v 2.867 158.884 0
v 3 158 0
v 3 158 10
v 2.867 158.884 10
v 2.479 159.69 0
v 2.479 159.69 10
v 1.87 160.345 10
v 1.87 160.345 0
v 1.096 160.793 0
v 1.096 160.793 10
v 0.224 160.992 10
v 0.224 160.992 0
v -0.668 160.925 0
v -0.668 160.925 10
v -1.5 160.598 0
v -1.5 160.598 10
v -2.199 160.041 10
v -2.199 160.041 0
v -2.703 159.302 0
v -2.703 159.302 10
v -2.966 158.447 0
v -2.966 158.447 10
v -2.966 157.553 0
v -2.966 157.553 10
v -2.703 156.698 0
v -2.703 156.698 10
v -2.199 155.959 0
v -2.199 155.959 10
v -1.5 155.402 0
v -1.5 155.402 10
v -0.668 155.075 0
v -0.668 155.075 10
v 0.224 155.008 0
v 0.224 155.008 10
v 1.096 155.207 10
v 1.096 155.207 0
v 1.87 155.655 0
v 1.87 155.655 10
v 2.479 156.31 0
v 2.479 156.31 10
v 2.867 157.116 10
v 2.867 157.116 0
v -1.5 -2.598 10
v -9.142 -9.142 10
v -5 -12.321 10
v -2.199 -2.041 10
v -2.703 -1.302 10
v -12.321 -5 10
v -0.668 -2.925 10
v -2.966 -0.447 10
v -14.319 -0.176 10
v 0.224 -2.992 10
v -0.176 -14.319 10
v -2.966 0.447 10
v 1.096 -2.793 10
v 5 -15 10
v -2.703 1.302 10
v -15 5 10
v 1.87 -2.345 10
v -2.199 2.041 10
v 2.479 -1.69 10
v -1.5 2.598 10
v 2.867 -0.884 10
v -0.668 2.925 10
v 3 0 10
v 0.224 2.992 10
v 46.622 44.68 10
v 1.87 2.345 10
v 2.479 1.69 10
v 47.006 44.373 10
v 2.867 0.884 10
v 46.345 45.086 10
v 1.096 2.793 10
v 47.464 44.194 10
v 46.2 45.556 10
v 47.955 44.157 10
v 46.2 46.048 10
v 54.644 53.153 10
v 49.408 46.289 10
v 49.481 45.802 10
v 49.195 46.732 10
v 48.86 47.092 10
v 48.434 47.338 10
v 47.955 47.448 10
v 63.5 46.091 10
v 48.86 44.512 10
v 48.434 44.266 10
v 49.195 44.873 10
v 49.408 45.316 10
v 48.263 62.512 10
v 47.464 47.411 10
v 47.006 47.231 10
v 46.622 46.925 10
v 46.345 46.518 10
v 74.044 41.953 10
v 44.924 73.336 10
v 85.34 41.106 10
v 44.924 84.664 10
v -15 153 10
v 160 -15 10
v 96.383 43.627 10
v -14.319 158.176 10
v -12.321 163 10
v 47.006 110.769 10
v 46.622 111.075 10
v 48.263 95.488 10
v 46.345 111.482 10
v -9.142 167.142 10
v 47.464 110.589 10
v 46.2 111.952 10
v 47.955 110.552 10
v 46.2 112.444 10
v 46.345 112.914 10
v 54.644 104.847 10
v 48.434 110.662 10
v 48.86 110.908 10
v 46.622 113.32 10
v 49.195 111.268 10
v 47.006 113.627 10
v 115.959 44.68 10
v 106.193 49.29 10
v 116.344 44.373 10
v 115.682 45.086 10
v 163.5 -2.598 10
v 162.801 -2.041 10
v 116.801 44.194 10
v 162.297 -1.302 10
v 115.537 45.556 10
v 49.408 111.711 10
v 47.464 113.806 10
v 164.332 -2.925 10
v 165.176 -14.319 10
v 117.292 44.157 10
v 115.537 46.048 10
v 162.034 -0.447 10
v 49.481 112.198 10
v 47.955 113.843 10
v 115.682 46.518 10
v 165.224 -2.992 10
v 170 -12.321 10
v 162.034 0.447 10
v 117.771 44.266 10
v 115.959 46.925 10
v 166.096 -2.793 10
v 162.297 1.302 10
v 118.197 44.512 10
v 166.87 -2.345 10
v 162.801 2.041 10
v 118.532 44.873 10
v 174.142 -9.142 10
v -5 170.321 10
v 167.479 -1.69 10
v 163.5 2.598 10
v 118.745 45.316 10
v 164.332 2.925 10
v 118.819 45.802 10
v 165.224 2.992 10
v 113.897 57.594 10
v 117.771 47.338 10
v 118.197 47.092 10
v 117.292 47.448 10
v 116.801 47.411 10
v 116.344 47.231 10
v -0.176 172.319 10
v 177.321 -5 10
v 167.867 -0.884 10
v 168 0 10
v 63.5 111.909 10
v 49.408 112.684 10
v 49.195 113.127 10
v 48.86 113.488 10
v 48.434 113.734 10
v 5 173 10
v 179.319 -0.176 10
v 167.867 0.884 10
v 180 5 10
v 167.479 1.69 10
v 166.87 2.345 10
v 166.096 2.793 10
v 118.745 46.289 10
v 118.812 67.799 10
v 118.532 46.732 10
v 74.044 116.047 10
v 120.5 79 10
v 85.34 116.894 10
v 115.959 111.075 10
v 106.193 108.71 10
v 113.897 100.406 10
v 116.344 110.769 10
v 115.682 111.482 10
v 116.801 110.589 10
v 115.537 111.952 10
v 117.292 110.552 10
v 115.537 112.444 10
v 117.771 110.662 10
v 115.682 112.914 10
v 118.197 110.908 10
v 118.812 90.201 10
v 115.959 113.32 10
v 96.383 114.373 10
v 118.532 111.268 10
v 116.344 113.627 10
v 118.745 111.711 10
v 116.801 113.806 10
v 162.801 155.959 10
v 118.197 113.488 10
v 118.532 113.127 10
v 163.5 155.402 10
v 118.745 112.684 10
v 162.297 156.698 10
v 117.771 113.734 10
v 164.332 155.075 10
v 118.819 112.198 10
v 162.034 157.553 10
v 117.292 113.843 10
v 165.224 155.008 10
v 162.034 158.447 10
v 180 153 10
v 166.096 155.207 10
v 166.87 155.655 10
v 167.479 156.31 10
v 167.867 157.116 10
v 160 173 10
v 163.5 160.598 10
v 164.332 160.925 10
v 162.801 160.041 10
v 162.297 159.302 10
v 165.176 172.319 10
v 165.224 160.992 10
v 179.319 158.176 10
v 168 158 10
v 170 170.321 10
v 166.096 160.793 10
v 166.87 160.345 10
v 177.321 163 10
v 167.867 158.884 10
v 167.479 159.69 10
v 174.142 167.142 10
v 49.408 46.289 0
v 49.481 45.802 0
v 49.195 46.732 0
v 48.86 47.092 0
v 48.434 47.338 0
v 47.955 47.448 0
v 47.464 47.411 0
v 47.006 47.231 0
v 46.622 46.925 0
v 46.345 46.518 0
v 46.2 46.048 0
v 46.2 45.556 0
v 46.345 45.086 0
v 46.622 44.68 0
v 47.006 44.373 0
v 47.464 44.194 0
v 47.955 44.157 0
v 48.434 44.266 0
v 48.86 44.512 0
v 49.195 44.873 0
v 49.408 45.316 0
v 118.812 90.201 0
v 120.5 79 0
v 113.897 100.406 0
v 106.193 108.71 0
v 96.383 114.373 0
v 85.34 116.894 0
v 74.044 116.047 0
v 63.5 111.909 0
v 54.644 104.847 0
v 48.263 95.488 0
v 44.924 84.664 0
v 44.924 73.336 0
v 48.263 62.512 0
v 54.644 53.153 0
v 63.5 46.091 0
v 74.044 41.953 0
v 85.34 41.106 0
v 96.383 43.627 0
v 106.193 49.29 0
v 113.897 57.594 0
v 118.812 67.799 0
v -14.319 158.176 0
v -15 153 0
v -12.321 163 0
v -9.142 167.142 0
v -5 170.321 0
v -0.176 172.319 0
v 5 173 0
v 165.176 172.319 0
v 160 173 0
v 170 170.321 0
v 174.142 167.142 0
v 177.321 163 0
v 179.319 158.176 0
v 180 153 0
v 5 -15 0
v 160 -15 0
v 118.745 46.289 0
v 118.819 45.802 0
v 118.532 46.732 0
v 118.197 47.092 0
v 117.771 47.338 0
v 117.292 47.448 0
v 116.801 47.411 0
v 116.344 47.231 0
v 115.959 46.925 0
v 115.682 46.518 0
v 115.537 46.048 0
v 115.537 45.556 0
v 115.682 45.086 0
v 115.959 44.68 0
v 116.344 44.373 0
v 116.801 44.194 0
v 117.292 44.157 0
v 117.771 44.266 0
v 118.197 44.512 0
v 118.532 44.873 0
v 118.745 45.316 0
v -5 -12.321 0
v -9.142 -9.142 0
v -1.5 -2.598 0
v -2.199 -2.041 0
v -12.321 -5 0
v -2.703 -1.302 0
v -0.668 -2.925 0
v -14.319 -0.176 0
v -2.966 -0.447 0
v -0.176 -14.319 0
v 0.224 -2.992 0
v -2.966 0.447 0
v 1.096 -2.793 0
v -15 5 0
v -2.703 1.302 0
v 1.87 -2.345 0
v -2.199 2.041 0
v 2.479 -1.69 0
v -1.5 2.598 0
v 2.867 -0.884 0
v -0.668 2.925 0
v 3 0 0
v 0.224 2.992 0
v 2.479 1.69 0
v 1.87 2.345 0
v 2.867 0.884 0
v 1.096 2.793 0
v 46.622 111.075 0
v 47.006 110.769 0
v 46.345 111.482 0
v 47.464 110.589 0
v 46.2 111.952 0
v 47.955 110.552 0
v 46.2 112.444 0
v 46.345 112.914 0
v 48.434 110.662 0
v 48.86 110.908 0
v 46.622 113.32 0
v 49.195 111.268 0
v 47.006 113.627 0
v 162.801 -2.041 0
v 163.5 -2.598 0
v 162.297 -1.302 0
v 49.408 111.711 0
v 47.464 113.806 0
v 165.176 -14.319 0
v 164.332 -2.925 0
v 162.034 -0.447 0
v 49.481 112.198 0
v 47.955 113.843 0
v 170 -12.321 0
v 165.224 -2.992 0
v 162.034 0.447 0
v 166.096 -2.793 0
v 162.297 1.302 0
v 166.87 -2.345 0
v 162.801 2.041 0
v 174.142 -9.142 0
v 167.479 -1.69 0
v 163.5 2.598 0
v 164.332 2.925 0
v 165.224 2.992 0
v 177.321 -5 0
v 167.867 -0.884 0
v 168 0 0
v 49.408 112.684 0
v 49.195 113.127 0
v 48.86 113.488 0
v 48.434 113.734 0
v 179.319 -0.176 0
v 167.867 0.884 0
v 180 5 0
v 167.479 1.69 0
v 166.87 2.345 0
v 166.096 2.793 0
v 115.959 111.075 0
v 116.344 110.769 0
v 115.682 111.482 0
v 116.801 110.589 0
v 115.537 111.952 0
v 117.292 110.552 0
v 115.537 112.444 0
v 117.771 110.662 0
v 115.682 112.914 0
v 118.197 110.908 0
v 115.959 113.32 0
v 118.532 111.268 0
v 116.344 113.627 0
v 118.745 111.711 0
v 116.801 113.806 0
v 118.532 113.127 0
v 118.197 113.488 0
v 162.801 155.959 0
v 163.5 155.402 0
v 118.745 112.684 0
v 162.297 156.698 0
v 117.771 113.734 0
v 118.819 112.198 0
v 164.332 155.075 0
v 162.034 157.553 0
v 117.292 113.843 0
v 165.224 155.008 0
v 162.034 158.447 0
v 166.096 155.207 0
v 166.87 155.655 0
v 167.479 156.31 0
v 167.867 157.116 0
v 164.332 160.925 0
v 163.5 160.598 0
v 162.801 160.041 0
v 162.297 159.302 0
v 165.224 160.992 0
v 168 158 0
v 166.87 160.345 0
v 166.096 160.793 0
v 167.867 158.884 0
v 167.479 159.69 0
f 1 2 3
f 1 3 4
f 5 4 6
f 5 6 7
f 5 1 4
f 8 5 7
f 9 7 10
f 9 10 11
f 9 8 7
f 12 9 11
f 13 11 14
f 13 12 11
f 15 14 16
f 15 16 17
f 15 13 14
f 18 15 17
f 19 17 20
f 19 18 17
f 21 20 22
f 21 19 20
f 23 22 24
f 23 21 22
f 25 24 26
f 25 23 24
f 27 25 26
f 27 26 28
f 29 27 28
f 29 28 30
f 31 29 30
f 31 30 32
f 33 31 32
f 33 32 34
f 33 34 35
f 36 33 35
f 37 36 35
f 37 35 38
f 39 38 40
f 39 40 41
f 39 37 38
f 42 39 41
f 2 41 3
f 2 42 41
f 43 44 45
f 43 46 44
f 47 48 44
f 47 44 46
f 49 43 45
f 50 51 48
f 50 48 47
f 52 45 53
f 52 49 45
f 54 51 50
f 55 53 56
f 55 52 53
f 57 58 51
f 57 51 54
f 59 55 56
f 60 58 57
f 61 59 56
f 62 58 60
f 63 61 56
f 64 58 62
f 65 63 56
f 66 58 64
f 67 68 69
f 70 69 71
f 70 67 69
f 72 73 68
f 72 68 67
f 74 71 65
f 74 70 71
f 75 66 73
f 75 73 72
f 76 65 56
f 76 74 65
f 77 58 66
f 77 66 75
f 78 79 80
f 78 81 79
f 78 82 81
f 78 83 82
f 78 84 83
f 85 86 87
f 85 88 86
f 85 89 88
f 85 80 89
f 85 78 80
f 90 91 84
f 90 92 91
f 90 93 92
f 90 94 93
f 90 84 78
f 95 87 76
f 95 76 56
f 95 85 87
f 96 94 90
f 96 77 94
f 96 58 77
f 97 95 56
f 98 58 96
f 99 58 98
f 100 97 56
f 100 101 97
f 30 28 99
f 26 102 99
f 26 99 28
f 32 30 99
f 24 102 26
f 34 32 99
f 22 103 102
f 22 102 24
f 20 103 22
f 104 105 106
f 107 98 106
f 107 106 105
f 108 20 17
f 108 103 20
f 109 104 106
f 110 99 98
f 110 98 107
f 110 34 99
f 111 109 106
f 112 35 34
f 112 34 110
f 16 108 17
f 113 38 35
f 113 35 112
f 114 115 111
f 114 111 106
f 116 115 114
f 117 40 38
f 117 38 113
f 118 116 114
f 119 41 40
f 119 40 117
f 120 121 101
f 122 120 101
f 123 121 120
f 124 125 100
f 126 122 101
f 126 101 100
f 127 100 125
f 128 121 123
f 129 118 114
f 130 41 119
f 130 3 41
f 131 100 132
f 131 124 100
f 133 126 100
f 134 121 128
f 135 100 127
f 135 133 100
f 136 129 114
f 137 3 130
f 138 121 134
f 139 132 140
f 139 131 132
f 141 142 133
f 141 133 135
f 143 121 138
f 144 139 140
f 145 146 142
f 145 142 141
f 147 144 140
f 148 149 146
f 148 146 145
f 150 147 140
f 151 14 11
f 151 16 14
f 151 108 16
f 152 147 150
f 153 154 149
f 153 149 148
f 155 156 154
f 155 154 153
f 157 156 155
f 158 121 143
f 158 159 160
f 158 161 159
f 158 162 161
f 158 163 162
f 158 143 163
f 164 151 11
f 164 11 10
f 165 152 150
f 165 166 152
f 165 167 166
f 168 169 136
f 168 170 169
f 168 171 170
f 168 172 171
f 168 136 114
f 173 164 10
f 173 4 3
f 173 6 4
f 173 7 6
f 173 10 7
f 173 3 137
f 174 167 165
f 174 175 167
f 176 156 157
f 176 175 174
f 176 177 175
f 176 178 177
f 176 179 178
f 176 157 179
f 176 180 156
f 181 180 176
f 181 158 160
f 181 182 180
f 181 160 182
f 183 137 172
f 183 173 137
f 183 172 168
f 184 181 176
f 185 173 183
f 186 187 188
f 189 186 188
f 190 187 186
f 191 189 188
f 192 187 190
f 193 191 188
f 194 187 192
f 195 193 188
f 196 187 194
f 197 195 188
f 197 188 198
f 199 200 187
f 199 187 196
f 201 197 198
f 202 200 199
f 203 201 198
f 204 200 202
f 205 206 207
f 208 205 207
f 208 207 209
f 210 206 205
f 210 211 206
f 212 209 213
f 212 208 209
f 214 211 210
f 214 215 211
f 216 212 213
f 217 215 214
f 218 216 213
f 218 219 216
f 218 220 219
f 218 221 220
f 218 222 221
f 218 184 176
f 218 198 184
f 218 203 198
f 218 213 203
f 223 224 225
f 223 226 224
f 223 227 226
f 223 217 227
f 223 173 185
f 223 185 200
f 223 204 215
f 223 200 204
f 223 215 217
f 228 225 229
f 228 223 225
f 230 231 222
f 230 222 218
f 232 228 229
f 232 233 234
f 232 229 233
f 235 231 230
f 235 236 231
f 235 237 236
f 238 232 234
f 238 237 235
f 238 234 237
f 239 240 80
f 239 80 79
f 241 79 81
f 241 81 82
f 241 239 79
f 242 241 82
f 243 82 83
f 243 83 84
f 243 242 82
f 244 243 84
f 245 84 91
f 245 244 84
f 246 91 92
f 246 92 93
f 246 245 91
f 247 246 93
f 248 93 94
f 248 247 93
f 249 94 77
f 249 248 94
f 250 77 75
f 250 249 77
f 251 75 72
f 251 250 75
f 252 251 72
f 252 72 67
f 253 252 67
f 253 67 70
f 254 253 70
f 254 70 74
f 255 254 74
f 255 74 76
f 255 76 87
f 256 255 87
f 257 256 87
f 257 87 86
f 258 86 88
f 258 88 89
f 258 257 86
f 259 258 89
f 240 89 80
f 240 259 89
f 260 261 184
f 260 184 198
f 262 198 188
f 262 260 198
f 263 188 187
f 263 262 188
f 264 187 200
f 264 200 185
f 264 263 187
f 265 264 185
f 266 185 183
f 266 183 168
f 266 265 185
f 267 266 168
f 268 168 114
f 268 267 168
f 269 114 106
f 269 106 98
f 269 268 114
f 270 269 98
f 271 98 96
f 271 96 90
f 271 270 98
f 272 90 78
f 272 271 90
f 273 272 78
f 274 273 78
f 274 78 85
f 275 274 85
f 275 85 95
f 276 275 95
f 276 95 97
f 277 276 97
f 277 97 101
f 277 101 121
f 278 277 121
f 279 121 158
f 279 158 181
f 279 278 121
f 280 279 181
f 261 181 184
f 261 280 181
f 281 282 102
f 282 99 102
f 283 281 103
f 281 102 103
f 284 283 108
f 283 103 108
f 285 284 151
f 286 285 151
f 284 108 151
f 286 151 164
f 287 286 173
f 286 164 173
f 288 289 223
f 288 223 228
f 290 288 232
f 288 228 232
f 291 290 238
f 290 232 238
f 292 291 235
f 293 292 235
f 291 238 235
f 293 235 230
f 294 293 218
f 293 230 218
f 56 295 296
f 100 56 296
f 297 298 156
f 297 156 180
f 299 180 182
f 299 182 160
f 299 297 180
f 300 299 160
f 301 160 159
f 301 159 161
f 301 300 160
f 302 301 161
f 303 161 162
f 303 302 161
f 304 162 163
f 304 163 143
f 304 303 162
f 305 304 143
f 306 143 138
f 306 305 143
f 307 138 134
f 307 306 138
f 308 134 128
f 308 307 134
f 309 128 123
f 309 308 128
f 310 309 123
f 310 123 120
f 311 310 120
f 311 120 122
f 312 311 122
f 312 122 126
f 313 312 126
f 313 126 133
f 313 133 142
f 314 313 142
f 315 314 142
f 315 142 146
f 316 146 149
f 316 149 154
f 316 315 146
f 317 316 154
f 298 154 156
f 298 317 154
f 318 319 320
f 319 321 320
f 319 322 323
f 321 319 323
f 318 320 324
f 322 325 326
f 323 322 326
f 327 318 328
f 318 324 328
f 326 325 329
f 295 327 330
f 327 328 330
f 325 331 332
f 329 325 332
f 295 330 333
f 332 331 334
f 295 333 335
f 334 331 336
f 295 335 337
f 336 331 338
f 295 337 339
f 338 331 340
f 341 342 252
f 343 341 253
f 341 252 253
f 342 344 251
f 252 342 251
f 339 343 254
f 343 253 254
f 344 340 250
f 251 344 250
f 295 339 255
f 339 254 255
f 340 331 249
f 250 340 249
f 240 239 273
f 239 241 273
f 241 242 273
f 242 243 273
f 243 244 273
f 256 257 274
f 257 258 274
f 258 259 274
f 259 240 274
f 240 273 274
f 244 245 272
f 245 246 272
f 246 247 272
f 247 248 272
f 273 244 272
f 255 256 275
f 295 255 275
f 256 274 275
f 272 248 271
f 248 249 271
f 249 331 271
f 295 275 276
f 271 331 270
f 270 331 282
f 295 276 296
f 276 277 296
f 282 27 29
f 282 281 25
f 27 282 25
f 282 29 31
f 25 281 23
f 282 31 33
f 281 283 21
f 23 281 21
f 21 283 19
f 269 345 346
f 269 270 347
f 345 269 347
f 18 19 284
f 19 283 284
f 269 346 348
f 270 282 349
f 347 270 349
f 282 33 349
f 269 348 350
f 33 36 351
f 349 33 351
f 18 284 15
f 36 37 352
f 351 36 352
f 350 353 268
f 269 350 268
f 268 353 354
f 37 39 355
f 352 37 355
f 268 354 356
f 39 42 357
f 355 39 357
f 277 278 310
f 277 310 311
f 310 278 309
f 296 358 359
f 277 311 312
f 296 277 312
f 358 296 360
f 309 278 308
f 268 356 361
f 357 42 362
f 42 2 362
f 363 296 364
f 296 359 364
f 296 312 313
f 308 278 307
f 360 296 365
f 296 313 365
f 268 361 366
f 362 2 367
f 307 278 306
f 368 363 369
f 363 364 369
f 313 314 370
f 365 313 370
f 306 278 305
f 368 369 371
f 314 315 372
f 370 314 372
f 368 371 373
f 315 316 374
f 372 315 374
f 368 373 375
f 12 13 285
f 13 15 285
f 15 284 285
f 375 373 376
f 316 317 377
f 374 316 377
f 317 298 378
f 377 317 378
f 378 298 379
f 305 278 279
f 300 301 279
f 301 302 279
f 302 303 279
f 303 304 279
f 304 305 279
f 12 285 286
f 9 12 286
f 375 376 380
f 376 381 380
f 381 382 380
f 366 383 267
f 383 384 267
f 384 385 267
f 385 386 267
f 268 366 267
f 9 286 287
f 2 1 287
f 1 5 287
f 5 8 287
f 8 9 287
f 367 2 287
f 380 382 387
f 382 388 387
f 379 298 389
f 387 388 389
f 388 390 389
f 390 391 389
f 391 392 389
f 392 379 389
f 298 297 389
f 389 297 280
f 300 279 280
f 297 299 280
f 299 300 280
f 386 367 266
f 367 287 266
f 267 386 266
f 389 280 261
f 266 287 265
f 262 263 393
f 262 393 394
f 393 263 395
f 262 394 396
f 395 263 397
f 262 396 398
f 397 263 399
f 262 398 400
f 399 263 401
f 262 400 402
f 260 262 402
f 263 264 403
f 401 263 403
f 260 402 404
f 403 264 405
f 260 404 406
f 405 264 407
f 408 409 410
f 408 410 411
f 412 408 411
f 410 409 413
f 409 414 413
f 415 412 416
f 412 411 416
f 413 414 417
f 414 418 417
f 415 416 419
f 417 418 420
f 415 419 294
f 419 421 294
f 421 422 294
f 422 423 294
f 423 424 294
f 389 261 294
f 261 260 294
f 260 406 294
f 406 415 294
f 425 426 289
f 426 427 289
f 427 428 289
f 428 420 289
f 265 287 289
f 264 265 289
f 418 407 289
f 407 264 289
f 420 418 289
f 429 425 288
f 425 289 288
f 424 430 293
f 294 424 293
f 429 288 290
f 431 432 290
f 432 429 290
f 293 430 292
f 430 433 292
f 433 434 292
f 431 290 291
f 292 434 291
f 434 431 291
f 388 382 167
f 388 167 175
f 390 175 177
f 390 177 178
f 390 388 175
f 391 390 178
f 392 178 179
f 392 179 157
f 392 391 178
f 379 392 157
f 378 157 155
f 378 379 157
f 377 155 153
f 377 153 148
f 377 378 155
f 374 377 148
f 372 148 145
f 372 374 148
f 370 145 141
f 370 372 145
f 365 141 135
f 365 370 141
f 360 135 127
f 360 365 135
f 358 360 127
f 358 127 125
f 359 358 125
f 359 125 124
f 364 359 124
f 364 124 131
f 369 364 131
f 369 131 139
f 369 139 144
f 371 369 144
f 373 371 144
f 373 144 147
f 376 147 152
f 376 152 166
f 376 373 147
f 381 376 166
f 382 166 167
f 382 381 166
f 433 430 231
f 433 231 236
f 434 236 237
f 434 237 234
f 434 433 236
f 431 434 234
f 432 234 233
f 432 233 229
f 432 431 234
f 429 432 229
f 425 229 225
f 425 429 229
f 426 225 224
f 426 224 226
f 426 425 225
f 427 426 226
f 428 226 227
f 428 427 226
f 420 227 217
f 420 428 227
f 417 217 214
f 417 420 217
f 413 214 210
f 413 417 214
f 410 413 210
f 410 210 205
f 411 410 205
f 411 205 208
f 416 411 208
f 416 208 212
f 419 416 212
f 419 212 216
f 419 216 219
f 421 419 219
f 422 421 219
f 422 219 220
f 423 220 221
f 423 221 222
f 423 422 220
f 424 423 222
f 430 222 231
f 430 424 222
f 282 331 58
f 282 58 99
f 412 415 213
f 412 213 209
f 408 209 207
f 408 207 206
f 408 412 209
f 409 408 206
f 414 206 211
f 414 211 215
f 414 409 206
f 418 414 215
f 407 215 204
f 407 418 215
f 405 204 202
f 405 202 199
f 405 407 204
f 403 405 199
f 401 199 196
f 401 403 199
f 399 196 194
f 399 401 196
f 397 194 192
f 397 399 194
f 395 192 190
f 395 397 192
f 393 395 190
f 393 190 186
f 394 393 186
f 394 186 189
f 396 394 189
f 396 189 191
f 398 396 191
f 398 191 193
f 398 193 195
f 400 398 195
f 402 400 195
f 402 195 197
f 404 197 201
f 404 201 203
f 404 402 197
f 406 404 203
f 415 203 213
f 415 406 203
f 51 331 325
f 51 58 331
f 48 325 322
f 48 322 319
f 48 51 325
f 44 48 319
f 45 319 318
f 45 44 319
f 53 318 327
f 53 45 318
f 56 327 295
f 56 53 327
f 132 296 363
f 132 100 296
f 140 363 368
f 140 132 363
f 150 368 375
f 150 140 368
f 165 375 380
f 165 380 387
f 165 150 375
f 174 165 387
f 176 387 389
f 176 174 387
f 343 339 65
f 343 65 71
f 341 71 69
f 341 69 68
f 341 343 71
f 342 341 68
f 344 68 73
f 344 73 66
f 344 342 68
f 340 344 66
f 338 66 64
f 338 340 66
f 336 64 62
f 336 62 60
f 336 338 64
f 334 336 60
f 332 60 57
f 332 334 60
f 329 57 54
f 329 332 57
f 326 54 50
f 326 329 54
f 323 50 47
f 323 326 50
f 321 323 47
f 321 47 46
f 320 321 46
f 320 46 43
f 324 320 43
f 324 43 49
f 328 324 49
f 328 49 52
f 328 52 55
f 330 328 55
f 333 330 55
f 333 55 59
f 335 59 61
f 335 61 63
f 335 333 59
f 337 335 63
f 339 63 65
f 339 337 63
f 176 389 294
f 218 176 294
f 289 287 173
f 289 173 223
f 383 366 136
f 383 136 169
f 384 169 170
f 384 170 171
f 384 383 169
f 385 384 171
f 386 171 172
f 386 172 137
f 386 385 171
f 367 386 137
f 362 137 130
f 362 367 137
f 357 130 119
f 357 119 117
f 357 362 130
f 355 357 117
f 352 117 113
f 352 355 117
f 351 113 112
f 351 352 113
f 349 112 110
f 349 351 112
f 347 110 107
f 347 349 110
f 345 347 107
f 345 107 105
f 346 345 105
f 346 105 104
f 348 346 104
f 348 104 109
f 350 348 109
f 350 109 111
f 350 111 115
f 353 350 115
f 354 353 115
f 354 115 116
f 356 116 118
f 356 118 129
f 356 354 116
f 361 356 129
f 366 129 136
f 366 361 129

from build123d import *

# Parameters (mm, degrees)
SKETCH1_W           = 195
SKETCH1_H           = 188
SKETCH1_R           = 3
SKETCH1_R_2         = 38
SKETCH1_R_3         = 1.65
BOSS_EXTRUDE1_DEPTH = 10
FILLET1_R           = 20


with BuildPart() as part:
    # Sketch1 → Boss-Extrude1 (new body)
    with BuildSketch(Plane.XY):
        with Locations((82.5, 79)):
            Rectangle(SKETCH1_W, SKETCH1_H)
        with Locations((165, 0)):
            Circle(SKETCH1_R, mode=Mode.SUBTRACT)
        with Locations((165, 158)):
            Circle(SKETCH1_R, mode=Mode.SUBTRACT)
        with Locations((0, 158)):
            Circle(SKETCH1_R, mode=Mode.SUBTRACT)
        Circle(SKETCH1_R, mode=Mode.SUBTRACT)
        with Locations((82.5, 79)):
            Circle(SKETCH1_R_2, mode=Mode.SUBTRACT)
        with Locations((117.168551284, 112.19776426)):
            Circle(SKETCH1_R_3, mode=Mode.SUBTRACT)
        with Locations((47.831448716, 112.19776426)):
            Circle(SKETCH1_R_3, mode=Mode.SUBTRACT)
        with Locations((47.831448716, 45.80223574)):
            Circle(SKETCH1_R_3, mode=Mode.SUBTRACT)
        with Locations((117.168551284, 45.80223574)):
            Circle(SKETCH1_R_3, mode=Mode.SUBTRACT)
    extrude(amount=BOSS_EXTRUDE1_DEPTH)

    # Fillet1
    fillet1_edges = [part.edges().sort_by_distance(p)[0] for p in [
        (-15, 173, 5),
        (180, 173, 5),
        (180, -15, 5),
        (-15, -15, 5),
    ]]
    fillet(fillet1_edges, radius=FILLET1_R)


solid = part.part
